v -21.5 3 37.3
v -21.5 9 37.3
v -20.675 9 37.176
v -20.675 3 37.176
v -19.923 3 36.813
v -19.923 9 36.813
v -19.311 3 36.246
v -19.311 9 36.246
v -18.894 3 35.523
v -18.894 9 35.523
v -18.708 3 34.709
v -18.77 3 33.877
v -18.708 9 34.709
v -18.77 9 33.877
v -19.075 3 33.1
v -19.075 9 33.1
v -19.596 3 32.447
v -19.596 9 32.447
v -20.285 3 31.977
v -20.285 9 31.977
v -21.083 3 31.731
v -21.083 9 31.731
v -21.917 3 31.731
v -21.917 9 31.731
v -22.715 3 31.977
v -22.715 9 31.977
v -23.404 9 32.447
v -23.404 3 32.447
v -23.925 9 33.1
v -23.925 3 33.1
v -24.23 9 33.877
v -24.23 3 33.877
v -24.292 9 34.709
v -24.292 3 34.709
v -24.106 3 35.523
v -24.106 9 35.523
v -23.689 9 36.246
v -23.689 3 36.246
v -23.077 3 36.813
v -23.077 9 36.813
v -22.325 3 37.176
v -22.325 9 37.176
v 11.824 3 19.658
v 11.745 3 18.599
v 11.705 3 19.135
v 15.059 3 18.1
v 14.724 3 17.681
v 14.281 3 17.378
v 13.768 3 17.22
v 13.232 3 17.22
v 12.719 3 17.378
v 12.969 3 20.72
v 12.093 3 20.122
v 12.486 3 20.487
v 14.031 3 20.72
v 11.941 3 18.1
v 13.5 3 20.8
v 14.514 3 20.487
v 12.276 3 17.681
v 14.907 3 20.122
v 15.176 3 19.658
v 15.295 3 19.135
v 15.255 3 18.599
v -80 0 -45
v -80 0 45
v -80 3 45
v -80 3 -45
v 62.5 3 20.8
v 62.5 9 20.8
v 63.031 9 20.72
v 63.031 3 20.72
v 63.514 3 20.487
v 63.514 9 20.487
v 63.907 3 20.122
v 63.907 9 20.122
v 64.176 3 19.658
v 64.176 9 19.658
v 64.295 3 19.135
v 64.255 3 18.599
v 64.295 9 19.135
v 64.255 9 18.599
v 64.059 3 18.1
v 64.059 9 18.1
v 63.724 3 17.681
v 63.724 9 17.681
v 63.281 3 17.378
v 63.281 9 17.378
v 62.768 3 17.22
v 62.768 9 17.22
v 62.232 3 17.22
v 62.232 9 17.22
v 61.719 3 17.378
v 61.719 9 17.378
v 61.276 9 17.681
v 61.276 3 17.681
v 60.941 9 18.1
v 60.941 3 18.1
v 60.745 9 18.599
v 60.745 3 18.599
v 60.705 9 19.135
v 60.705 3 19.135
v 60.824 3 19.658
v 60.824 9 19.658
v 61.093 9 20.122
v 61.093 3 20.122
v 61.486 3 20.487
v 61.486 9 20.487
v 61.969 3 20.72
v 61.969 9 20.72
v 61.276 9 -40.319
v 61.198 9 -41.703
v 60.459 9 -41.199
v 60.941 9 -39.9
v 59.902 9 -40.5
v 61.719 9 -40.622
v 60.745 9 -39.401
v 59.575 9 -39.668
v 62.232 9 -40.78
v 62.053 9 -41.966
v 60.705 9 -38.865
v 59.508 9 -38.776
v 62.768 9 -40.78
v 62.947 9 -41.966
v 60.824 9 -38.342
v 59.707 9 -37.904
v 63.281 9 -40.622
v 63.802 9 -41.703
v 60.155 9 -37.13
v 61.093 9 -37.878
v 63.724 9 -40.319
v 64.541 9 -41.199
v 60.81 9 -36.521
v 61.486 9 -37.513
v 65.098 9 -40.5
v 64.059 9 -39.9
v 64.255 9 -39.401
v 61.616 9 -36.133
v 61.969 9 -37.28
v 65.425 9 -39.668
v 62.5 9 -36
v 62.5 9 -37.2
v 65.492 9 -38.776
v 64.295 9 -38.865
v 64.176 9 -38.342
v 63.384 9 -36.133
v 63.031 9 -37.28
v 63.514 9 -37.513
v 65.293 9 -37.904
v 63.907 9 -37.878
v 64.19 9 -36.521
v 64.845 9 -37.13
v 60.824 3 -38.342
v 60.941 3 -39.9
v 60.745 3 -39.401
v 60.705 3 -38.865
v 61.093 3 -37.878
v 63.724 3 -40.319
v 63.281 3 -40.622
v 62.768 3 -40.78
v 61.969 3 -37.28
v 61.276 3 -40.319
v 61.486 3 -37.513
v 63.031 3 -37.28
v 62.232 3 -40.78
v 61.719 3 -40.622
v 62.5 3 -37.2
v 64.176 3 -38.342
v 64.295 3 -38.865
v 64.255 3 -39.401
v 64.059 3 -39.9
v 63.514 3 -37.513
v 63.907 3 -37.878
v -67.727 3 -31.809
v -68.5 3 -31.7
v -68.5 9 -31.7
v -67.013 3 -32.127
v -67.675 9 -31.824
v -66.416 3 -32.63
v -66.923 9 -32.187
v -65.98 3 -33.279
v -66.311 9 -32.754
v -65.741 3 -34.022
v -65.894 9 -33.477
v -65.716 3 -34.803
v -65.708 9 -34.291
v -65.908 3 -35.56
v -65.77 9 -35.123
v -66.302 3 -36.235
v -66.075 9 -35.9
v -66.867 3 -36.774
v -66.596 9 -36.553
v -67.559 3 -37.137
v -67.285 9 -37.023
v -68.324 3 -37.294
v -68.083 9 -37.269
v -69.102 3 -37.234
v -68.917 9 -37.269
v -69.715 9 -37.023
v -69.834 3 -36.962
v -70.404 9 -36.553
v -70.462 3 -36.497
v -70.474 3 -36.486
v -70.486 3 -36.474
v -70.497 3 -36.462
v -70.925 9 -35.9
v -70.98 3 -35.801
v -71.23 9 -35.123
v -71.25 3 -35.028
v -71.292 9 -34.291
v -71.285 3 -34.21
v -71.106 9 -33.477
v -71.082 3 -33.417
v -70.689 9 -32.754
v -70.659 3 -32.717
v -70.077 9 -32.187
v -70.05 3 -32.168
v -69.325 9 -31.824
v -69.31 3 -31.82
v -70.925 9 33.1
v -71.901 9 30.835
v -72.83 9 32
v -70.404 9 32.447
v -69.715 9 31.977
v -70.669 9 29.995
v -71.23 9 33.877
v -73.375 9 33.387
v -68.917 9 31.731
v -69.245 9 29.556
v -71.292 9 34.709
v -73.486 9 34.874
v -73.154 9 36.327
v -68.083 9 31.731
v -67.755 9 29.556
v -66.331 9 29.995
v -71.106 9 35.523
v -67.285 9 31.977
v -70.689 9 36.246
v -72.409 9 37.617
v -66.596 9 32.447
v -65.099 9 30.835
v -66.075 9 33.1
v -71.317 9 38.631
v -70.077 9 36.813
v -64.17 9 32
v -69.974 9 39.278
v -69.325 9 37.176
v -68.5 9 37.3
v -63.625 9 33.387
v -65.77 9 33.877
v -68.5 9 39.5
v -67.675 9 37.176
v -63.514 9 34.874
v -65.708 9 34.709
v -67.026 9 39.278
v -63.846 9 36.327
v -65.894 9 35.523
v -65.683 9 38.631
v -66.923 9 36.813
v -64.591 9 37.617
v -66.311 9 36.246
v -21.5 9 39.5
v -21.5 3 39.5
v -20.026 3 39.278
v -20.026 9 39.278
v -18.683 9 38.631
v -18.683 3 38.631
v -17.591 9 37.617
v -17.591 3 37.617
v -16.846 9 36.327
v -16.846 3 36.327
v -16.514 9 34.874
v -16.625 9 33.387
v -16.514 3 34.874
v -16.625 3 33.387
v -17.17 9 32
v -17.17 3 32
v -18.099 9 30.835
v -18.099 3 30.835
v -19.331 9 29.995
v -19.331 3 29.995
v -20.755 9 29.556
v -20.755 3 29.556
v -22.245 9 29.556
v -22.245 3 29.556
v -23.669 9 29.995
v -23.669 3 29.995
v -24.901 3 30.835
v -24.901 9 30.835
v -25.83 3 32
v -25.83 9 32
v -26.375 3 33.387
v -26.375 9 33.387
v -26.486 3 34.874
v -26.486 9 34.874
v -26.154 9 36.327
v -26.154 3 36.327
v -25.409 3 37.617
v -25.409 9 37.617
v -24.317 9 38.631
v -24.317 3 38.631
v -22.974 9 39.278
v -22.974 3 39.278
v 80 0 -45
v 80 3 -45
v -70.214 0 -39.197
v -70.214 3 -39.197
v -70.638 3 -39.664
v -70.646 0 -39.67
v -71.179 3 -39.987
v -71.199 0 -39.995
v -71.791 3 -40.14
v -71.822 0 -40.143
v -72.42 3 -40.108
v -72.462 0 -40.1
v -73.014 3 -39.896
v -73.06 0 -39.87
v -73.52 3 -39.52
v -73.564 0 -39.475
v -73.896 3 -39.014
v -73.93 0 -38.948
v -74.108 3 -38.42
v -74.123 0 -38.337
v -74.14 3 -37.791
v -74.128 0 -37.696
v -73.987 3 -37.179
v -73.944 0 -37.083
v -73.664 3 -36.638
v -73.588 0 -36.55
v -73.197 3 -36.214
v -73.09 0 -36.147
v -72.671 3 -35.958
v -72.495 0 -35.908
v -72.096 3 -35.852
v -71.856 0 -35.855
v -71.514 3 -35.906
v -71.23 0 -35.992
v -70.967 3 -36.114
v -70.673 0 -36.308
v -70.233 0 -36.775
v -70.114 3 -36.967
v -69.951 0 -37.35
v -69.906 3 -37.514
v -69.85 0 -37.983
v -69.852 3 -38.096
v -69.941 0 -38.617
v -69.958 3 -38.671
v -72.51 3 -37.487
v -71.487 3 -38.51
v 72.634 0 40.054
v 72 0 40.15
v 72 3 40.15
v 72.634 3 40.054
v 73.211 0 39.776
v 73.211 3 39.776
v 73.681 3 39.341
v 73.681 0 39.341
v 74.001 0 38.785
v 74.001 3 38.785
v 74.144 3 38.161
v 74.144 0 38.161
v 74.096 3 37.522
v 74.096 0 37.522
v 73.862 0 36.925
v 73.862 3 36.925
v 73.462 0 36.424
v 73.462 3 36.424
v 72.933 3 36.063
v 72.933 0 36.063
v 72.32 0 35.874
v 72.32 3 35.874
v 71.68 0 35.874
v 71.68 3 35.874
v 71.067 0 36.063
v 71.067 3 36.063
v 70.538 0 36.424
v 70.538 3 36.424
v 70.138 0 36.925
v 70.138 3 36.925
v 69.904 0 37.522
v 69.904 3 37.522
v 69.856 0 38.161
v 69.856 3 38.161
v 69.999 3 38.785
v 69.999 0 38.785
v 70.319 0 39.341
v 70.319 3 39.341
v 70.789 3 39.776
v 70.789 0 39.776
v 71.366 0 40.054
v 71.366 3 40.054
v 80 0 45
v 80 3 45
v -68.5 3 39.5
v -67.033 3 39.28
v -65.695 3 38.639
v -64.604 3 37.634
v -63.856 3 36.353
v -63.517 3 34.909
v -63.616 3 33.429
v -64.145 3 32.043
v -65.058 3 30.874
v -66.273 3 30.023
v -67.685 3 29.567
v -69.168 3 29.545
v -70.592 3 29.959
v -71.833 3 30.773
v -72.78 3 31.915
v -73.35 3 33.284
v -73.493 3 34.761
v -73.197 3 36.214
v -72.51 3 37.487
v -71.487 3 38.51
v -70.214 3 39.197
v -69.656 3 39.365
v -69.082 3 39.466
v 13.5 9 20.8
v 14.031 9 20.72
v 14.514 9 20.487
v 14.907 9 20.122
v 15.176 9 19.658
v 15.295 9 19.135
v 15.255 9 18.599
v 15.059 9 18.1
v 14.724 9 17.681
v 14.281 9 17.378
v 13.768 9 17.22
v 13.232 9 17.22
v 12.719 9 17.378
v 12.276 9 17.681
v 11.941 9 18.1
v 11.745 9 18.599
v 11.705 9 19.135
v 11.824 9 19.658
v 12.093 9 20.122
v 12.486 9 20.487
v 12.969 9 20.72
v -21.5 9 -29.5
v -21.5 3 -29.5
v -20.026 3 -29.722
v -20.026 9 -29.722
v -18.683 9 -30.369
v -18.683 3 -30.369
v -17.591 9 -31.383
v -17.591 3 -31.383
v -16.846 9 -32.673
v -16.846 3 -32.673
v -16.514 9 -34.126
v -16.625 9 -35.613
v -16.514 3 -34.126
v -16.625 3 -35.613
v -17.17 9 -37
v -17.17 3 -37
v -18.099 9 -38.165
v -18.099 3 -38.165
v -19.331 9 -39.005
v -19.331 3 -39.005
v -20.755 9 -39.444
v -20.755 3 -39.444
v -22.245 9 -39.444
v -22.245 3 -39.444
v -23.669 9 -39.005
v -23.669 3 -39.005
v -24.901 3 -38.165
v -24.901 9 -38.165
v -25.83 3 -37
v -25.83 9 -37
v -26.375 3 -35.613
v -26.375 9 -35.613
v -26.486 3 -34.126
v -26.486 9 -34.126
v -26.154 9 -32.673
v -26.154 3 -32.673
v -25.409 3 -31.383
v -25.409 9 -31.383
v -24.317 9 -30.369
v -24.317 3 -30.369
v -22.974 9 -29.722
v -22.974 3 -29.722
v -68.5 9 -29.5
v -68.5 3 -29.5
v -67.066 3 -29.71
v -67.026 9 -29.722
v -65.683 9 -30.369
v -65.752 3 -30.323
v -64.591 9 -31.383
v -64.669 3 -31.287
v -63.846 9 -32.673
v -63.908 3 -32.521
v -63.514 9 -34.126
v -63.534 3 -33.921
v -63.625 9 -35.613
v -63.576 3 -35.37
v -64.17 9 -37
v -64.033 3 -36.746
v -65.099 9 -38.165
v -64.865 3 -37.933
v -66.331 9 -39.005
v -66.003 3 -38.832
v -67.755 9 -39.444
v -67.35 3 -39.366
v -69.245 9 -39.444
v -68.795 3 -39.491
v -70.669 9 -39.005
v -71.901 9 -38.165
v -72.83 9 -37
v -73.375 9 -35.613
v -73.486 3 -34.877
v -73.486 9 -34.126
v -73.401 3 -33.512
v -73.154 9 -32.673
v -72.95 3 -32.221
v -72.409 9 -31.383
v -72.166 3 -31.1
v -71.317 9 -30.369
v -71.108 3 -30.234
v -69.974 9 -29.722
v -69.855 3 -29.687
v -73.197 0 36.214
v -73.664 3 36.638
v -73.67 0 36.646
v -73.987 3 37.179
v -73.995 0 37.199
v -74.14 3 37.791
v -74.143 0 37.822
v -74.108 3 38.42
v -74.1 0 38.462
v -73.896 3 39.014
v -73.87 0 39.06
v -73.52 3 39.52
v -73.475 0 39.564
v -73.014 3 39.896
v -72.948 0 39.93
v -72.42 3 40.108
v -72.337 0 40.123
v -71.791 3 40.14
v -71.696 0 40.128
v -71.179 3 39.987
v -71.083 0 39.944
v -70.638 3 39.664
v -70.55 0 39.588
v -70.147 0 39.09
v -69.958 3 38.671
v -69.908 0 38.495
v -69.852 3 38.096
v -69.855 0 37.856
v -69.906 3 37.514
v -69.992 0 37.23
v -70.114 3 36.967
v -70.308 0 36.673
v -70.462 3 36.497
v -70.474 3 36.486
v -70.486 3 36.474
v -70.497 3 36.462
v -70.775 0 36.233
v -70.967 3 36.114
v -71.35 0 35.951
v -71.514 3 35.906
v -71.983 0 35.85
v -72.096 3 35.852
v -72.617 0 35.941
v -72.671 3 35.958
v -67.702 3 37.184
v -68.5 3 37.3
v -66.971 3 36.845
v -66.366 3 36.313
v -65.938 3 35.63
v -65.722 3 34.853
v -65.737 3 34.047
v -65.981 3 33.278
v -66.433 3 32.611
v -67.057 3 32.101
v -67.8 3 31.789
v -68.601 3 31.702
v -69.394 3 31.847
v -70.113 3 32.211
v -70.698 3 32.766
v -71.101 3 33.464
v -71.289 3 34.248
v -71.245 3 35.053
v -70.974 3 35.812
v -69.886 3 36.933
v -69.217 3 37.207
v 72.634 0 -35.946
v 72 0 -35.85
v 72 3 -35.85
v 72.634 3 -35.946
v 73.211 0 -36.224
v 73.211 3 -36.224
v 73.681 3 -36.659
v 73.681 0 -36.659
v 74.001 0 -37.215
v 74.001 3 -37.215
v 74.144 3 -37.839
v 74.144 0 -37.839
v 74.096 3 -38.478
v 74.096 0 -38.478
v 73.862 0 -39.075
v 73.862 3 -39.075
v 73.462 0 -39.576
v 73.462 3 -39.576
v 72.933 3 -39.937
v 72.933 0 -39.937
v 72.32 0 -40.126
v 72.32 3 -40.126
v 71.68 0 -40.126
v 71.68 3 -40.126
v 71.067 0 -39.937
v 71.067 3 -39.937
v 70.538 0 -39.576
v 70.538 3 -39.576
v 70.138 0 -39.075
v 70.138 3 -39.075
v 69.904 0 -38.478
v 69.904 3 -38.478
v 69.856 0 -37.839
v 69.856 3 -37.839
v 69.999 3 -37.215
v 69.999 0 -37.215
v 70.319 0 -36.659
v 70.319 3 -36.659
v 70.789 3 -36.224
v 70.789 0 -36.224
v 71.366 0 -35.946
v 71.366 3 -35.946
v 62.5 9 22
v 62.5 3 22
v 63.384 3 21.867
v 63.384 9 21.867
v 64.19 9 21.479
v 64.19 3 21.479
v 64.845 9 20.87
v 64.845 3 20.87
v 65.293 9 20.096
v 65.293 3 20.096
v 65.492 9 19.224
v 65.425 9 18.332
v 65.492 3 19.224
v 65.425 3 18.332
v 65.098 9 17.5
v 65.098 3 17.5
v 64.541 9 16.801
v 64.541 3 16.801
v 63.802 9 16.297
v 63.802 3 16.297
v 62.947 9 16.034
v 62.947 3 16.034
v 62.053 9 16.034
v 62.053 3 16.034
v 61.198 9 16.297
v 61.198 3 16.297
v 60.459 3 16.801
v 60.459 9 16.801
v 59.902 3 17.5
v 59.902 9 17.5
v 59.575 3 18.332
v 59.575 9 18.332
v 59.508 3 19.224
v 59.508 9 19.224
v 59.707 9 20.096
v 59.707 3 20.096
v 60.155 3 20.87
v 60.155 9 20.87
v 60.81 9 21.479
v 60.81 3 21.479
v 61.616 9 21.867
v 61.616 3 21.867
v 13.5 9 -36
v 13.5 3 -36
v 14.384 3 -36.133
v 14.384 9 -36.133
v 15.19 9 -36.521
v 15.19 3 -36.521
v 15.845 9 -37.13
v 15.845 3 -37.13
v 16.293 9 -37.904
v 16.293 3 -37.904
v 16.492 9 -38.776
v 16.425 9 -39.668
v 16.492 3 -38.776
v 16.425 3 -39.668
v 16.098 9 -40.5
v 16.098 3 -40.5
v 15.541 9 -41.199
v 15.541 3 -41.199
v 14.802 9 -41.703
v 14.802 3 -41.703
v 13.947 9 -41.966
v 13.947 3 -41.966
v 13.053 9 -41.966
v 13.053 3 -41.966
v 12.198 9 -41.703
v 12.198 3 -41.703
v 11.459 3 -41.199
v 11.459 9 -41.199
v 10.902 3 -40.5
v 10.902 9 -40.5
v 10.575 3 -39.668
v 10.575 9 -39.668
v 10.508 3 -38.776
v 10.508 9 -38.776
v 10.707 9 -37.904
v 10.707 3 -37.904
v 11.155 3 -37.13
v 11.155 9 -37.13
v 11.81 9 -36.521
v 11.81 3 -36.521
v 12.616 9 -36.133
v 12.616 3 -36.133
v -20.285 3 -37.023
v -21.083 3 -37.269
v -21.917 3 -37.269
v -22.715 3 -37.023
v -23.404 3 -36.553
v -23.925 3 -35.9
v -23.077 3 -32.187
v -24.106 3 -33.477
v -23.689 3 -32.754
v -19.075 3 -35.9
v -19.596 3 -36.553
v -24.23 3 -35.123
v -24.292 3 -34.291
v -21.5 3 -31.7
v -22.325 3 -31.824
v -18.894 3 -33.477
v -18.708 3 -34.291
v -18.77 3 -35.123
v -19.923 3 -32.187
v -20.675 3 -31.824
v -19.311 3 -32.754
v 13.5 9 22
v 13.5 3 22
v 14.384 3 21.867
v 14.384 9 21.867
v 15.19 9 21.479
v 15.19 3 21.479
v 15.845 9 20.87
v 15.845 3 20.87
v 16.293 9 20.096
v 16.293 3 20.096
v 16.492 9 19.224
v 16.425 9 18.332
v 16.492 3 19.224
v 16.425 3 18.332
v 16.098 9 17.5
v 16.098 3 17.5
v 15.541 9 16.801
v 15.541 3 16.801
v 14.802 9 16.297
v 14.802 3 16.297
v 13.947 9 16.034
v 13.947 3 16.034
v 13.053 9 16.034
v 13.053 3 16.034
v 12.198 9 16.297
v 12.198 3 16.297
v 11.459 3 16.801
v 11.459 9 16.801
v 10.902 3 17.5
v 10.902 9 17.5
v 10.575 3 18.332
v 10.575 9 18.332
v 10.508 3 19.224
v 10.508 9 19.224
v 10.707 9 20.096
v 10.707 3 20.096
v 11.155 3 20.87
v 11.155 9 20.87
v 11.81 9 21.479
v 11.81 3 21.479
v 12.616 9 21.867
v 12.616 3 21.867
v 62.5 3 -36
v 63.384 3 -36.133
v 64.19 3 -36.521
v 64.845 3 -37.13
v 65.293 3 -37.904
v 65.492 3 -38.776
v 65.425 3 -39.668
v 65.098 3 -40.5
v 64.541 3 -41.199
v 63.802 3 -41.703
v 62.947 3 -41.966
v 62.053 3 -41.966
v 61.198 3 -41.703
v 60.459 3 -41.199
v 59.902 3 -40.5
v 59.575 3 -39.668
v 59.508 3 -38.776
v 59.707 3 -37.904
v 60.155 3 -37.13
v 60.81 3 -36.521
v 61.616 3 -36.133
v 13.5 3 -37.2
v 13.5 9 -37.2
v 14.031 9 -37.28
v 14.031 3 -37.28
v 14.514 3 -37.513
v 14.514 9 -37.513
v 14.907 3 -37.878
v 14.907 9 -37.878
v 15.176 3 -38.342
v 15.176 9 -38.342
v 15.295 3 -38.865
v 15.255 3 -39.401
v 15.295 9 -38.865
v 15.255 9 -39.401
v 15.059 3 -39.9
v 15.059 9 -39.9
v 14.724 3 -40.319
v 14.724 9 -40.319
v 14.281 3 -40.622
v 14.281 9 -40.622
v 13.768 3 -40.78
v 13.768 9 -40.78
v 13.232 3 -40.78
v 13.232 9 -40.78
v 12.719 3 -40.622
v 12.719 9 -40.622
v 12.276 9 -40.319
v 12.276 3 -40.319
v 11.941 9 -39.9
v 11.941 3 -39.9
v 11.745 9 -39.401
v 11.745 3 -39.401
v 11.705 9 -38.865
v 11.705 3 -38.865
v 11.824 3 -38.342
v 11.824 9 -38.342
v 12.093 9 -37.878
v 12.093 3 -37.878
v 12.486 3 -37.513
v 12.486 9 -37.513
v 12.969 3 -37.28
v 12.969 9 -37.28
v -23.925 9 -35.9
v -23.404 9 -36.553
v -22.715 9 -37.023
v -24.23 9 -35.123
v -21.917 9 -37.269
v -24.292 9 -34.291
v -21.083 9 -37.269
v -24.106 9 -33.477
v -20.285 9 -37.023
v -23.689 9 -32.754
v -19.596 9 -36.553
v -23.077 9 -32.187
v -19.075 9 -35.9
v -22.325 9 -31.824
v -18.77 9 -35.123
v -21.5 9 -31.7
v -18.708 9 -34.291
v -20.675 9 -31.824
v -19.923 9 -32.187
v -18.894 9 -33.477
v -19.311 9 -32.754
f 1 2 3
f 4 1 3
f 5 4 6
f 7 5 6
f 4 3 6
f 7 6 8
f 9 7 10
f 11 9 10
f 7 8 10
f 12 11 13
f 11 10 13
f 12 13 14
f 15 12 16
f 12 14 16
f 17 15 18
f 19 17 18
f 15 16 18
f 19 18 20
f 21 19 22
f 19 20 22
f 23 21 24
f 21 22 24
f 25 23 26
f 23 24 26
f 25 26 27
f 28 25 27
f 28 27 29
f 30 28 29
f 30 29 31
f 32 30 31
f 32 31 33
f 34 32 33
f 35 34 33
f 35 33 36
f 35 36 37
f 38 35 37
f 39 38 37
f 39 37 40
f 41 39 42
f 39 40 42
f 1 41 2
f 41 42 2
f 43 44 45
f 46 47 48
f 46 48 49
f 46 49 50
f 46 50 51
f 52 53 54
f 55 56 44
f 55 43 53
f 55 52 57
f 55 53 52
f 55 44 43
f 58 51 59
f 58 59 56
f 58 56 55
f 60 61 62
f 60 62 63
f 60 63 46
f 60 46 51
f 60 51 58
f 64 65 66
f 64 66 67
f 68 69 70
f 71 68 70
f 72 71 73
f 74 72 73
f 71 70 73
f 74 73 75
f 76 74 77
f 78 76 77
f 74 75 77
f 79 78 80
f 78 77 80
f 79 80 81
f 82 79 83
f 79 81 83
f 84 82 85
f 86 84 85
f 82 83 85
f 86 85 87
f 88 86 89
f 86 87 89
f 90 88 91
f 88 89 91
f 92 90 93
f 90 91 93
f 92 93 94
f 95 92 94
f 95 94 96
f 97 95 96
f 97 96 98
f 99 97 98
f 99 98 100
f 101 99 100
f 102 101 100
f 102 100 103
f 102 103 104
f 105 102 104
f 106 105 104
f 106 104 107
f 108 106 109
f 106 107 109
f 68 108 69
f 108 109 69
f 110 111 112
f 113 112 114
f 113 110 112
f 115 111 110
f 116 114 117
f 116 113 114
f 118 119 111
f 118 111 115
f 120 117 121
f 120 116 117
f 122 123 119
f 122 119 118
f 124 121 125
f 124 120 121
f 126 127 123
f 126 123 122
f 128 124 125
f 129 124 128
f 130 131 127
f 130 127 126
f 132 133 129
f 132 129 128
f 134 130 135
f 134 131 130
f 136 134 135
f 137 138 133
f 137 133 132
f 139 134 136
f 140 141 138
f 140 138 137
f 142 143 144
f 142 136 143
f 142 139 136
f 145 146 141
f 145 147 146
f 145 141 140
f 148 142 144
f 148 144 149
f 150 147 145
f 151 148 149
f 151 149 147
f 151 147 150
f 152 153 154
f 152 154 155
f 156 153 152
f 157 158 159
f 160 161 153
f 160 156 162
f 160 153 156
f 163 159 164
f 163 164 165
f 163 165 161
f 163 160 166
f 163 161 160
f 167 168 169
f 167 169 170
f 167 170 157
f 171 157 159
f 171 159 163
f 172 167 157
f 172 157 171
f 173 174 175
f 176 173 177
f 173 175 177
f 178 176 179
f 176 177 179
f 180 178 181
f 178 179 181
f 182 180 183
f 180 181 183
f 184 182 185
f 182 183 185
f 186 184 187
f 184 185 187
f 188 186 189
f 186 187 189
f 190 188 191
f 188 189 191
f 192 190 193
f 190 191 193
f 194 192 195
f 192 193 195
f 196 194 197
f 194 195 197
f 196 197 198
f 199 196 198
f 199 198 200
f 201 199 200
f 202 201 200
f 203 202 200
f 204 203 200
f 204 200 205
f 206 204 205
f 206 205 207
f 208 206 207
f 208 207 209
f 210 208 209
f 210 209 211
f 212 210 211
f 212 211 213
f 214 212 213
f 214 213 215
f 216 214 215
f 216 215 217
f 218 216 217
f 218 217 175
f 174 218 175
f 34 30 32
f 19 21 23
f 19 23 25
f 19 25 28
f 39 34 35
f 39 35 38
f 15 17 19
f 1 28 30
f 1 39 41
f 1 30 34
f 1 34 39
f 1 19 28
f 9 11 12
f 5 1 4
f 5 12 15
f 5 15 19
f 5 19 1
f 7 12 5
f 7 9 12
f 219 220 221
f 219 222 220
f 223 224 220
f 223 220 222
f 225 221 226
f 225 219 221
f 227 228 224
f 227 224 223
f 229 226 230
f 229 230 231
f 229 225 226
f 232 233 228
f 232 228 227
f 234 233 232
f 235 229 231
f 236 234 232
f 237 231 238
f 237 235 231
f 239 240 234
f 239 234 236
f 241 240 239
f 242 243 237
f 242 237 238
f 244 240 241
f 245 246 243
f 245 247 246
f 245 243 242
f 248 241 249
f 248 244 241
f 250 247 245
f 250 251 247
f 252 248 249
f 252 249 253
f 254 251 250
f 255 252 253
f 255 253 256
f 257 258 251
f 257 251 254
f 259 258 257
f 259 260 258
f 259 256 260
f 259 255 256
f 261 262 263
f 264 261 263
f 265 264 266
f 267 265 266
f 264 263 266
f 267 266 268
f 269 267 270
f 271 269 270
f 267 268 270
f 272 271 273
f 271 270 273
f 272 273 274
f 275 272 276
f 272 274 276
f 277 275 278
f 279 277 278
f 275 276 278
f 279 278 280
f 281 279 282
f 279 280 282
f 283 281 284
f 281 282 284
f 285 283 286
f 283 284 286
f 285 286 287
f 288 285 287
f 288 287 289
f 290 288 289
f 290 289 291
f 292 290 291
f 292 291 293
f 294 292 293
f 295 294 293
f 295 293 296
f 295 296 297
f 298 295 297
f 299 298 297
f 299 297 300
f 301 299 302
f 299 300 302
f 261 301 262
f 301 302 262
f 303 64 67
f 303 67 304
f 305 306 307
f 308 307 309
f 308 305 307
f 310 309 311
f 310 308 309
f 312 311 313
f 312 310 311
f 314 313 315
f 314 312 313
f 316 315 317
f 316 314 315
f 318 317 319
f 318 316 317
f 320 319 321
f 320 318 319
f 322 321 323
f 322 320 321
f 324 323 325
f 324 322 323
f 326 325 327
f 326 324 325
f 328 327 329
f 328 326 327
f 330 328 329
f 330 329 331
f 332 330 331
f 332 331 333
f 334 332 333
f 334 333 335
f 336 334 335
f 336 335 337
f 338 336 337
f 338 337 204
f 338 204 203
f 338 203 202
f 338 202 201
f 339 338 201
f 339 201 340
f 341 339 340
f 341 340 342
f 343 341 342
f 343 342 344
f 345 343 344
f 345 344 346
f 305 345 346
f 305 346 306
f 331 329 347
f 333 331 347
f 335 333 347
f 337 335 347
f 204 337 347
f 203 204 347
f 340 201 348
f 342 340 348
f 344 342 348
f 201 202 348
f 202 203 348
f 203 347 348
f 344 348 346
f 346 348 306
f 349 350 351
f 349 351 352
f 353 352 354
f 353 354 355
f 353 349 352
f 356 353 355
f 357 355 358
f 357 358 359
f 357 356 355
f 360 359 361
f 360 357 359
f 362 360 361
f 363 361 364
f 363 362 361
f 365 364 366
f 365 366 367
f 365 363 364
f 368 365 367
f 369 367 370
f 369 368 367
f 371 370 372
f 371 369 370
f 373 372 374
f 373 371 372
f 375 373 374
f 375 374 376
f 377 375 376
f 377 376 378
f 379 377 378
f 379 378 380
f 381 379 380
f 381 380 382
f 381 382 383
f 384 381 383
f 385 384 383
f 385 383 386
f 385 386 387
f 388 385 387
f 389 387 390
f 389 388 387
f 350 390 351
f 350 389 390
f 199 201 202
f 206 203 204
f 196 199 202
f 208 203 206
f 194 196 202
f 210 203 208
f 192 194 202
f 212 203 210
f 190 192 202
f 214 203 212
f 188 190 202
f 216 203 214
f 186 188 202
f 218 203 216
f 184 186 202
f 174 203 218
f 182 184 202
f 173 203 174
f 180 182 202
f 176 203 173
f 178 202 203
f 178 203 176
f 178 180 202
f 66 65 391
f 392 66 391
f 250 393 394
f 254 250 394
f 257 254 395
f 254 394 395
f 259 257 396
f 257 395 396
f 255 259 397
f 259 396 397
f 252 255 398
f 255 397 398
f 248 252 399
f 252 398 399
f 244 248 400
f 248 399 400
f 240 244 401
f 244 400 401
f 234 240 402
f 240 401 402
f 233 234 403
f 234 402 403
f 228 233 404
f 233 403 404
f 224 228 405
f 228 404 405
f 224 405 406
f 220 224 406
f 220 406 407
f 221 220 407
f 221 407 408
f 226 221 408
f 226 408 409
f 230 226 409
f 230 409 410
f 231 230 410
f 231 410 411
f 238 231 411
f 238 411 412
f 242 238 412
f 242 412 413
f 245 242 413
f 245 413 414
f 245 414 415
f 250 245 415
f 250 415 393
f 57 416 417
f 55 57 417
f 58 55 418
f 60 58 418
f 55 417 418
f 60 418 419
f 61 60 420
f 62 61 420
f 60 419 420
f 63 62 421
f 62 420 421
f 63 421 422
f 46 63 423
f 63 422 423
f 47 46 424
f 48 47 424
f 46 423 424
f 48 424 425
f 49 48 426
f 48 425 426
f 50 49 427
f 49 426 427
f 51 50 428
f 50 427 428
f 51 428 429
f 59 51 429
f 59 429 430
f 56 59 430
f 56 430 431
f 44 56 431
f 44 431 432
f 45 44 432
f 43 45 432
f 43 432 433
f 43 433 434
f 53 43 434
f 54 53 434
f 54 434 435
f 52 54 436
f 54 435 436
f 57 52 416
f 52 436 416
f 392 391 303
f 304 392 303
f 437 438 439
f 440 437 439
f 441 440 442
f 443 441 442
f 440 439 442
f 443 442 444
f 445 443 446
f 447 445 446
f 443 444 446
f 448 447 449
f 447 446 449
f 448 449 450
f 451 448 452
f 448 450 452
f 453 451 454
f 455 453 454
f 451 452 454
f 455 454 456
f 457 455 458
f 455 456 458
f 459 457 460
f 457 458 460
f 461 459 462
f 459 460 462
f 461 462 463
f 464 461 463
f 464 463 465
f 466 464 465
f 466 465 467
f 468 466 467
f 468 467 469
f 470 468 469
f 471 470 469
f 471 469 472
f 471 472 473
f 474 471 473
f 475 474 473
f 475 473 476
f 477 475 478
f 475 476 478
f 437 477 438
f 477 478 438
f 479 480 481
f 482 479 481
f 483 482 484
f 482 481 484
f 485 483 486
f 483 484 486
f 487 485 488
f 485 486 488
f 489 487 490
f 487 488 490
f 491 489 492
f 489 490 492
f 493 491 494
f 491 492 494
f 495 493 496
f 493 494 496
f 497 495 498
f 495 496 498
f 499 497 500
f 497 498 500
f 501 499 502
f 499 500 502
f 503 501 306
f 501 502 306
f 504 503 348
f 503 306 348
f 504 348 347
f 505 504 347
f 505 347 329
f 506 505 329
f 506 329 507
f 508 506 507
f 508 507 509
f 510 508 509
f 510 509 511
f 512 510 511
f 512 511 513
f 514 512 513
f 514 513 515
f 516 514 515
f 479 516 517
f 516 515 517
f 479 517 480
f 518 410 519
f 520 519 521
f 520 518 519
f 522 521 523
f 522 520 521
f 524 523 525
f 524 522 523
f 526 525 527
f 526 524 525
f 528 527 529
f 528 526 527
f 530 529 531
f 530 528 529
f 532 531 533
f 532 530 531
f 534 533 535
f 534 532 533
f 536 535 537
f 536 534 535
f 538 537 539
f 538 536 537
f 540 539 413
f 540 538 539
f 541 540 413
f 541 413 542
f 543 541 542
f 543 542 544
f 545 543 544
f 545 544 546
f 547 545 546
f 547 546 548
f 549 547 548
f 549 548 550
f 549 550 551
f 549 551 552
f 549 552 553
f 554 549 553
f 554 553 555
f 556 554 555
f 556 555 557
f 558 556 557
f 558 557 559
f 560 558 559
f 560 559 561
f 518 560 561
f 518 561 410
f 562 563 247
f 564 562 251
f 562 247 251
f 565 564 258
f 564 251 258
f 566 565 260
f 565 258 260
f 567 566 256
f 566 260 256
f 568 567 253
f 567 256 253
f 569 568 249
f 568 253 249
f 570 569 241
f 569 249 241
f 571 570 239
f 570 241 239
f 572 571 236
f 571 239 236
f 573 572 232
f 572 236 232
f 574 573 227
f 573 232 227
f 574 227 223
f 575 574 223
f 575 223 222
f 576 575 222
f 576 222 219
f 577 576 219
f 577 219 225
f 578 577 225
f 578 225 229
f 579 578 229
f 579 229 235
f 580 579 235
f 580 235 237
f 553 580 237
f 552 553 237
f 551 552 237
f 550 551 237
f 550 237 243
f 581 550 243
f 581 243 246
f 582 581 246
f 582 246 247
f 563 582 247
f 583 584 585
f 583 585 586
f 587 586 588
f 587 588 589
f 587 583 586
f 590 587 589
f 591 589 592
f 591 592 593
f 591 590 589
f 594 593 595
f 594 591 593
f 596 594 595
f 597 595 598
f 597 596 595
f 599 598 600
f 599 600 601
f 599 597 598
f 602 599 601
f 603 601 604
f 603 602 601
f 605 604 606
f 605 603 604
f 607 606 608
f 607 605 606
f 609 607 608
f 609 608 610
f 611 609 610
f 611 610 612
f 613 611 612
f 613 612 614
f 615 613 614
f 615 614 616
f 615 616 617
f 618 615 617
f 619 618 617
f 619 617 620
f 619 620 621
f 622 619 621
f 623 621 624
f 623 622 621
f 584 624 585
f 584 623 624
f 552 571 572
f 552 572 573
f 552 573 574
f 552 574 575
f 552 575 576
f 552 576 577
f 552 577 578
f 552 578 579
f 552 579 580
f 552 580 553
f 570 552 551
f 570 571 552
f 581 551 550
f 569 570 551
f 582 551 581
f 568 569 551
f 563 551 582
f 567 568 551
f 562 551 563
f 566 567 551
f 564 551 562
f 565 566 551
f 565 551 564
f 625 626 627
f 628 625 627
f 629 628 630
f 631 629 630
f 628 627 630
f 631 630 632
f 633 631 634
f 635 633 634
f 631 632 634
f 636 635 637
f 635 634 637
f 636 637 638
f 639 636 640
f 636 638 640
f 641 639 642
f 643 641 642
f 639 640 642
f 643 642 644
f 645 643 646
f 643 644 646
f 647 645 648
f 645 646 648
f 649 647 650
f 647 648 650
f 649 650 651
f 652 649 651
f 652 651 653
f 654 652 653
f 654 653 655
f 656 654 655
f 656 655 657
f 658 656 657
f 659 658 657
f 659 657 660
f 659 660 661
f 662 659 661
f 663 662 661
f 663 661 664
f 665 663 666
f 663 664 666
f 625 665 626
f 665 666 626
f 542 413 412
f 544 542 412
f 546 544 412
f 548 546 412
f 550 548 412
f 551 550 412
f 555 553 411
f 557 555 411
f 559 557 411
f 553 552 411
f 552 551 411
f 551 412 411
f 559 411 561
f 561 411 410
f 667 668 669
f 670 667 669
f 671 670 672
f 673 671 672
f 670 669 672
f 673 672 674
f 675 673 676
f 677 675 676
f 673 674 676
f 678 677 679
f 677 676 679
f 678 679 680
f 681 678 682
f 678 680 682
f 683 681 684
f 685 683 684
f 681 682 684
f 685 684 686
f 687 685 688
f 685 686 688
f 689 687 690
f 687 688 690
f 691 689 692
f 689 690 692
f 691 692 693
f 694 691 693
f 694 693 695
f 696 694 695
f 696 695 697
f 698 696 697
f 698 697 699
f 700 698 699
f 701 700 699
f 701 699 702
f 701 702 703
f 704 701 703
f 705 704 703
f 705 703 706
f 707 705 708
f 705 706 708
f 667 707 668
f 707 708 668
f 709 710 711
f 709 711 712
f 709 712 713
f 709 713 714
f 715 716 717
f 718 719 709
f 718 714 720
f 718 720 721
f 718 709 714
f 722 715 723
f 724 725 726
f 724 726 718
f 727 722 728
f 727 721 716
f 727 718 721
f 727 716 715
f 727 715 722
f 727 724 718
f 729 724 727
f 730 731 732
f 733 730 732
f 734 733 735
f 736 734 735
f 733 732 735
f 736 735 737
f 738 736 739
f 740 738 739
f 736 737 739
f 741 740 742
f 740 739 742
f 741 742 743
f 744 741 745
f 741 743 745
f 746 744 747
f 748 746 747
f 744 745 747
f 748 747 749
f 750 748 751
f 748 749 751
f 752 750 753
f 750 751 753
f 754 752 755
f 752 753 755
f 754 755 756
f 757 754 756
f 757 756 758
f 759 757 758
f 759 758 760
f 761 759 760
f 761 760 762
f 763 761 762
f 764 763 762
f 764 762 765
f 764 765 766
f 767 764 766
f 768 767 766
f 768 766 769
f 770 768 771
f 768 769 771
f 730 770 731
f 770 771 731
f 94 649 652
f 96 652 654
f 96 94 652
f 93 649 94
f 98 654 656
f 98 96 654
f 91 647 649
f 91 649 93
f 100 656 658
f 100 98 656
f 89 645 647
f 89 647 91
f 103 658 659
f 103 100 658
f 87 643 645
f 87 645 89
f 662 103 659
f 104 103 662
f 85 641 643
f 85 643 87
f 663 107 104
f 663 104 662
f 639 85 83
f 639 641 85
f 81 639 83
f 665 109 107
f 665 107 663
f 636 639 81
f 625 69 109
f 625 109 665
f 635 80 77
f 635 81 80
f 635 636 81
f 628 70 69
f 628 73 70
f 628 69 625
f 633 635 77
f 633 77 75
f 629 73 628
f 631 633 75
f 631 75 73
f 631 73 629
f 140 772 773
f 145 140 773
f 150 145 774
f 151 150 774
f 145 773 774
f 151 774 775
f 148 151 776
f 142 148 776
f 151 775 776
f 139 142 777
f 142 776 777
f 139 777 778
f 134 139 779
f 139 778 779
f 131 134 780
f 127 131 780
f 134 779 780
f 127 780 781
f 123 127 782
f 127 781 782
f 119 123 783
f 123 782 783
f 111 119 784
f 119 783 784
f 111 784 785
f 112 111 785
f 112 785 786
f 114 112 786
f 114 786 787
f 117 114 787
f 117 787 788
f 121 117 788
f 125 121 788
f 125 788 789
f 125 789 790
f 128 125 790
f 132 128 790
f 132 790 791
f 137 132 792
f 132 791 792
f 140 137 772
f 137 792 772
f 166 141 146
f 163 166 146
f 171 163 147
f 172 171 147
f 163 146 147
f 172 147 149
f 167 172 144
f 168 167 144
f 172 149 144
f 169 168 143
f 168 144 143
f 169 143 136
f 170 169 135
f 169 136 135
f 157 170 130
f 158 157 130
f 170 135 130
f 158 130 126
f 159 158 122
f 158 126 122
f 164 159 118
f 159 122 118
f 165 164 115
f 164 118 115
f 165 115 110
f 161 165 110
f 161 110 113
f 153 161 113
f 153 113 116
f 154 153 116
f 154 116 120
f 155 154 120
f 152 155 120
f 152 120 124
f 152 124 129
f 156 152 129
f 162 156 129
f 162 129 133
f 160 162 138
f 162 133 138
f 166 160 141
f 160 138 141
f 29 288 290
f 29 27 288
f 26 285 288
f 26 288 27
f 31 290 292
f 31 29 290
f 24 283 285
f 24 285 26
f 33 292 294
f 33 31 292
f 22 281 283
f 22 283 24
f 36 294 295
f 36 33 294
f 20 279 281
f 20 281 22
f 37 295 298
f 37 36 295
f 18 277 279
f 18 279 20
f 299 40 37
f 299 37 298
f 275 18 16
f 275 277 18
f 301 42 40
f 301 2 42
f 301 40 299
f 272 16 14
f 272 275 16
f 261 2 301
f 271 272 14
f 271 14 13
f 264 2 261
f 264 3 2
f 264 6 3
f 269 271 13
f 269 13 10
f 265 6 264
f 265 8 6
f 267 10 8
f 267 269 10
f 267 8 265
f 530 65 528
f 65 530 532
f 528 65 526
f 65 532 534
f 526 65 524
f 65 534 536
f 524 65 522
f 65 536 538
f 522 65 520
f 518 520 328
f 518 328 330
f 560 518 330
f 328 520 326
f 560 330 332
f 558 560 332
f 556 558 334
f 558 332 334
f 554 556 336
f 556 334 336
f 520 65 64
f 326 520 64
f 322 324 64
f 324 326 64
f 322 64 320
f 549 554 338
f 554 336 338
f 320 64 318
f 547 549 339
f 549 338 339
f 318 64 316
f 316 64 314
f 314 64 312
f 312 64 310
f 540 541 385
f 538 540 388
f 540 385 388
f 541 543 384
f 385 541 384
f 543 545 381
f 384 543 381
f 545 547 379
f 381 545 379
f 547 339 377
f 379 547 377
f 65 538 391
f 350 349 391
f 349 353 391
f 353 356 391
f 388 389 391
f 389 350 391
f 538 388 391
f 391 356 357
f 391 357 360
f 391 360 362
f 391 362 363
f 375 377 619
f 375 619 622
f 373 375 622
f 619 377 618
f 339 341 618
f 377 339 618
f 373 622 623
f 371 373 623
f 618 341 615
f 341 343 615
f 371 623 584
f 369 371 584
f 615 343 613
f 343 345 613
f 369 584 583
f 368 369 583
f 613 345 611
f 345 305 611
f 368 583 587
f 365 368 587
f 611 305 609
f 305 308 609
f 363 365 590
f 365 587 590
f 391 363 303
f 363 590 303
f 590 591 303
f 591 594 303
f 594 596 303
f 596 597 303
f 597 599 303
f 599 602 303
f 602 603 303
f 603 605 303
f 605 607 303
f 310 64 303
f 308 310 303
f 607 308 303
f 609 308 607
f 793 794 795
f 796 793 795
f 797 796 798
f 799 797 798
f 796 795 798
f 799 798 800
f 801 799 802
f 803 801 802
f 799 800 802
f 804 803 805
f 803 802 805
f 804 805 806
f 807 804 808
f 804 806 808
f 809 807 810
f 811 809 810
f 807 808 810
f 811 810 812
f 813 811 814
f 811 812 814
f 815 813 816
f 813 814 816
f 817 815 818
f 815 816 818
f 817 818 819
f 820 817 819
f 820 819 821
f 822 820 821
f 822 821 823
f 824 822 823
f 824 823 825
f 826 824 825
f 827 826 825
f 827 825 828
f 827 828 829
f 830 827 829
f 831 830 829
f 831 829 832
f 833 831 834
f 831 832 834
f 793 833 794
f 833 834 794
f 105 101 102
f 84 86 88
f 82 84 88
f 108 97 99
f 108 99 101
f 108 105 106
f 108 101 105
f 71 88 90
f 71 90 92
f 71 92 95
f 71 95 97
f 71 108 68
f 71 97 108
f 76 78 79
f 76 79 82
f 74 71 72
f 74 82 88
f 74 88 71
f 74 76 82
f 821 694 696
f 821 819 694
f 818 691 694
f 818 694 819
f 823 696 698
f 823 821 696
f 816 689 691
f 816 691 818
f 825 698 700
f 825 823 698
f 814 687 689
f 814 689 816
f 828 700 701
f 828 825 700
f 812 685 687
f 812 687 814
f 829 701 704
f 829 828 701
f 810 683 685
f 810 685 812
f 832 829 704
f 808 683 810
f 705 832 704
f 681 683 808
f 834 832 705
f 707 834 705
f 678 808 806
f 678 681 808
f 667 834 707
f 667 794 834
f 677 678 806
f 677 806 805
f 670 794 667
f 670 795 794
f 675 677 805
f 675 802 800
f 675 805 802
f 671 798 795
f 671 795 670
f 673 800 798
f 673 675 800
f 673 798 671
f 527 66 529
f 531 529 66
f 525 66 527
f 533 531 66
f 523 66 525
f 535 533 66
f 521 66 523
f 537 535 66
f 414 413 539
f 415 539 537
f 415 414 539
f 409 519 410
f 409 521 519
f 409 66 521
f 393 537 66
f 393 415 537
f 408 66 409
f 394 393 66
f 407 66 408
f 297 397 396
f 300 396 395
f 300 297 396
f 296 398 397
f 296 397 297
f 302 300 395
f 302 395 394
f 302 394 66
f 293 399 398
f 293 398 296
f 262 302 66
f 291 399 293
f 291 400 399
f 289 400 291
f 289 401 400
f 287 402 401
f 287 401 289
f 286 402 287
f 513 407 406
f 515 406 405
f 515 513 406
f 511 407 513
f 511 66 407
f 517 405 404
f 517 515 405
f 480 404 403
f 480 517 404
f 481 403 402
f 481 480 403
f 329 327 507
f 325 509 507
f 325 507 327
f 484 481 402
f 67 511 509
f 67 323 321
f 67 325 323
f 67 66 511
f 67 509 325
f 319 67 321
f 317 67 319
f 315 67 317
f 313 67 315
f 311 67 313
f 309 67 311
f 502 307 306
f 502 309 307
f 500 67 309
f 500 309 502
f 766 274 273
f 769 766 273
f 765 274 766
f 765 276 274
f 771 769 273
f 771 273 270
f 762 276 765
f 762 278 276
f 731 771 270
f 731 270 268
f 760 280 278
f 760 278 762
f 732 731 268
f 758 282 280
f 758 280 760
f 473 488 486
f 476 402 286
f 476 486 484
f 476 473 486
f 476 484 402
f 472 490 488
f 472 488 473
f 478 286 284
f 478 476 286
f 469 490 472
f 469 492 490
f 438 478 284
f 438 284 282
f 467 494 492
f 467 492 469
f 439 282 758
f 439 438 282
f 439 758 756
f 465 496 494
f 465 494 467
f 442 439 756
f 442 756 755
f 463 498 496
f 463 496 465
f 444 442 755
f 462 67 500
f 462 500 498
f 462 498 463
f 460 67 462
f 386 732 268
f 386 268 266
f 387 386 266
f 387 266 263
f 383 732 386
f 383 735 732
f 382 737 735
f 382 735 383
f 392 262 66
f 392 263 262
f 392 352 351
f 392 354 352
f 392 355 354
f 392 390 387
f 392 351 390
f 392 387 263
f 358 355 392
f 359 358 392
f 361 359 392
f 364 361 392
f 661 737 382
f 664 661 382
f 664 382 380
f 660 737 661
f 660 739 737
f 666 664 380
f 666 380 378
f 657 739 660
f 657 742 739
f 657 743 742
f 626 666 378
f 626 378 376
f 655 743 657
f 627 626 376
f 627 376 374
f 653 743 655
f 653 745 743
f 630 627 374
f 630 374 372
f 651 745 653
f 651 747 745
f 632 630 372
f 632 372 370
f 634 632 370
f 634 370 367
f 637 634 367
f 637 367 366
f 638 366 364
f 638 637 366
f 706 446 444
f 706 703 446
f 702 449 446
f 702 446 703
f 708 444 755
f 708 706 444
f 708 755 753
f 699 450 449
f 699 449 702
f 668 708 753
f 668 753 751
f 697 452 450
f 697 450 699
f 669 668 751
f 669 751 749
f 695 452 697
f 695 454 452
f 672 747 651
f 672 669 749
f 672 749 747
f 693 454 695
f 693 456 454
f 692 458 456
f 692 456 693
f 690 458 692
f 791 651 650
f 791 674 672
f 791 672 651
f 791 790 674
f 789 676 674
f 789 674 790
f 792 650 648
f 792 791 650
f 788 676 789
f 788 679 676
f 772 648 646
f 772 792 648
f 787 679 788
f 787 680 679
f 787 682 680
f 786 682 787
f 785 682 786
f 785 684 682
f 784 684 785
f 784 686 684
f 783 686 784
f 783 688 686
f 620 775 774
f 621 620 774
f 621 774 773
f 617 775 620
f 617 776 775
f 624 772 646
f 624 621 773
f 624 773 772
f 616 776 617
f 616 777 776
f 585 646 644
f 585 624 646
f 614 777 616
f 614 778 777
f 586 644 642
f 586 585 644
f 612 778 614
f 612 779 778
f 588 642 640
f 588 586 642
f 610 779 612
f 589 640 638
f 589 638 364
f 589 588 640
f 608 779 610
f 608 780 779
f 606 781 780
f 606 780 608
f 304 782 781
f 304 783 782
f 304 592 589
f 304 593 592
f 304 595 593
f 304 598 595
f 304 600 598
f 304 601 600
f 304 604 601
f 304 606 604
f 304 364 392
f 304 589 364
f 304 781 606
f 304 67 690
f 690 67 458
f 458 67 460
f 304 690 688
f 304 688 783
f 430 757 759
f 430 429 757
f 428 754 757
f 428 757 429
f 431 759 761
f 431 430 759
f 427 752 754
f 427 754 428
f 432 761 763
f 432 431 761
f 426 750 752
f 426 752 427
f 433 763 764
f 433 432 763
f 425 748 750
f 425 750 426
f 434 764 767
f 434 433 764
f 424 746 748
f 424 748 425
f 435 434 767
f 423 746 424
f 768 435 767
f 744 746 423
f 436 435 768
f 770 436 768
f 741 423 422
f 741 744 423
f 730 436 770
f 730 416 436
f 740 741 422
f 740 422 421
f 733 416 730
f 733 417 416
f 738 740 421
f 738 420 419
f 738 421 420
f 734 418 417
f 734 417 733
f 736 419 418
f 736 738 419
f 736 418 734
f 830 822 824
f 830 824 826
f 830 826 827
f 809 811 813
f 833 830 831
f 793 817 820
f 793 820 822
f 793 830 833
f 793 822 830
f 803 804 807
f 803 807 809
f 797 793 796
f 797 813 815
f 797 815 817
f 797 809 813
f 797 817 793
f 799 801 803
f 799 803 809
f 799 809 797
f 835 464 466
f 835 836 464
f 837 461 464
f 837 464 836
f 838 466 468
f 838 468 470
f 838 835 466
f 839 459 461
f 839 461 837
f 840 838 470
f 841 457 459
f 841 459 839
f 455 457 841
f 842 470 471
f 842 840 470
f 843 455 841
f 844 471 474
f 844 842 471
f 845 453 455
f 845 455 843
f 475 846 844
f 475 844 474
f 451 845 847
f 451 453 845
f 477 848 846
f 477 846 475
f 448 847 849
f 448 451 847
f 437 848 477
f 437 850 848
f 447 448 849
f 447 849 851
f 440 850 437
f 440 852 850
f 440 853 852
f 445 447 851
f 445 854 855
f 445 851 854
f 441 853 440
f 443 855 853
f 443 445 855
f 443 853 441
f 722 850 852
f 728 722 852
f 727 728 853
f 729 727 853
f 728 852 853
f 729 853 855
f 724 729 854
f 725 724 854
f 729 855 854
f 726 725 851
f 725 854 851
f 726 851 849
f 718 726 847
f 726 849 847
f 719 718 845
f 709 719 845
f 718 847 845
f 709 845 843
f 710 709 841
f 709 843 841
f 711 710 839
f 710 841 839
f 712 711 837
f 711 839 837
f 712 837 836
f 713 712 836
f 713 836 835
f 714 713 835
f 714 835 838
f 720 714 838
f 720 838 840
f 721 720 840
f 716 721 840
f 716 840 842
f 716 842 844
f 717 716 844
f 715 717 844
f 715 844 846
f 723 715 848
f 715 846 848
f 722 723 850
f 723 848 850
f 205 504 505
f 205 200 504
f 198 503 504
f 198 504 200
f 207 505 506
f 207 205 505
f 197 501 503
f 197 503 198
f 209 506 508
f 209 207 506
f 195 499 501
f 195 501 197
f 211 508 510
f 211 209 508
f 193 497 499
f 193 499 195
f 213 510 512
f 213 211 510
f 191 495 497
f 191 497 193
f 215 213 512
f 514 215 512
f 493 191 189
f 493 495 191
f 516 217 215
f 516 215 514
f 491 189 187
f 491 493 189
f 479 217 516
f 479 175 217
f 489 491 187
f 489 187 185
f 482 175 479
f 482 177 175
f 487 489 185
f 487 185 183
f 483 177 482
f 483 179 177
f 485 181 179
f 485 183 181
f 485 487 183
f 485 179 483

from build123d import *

# Parameters (mm, degrees)
SK_PLATE_W         = 160
SK_PLATE_H         = 90
EX_PLATE_DEPTH     = 3
SK_STANDOFFS_R     = 3
SK_STANDOFFS_R_2   = 5
EX_STANDOFFS_DEPTH = 6
SK_INSERTS_R       = 1.8
SK_INSERTS_R_2     = 2.8
CUT_INSERTS_DEPTH  = 6
SK_PANHOLES_R      = 2.15
CUT_PANHOLES_DEPTH = 3


with BuildPart() as part:
    # SK_Plate → EX_Plate (new body)
    with BuildSketch(Plane(origin=(0, 0, 0), x_dir=(1, 0, 0), z_dir=(0, 1, 0))):
        Rectangle(SK_PLATE_W, SK_PLATE_H)
    extrude(amount=EX_PLATE_DEPTH)

    # SK_Standoffs → EX_Standoffs (add)
    with BuildSketch(Plane(origin=(0, 3, 0), x_dir=(1, 0, 0), z_dir=(0, 1, 0))):
        with Locations((62.5, 39)):
            Circle(SK_STANDOFFS_R)
        with Locations((13.5, 39)):
            Circle(SK_STANDOFFS_R)
        with Locations((62.5, -19)):
            Circle(SK_STANDOFFS_R)
        with Locations((13.5, -19)):
            Circle(SK_STANDOFFS_R)
        with Locations((-21.5, -34.5)):
            Circle(SK_STANDOFFS_R_2)
        with Locations((-68.5, -34.5)):
            Circle(SK_STANDOFFS_R_2)
        with Locations((-21.5, 34.5)):
            Circle(SK_STANDOFFS_R_2)
        with Locations((-68.5, 34.5)):
            Circle(SK_STANDOFFS_R_2)
    extrude(amount=EX_STANDOFFS_DEPTH)

    # SK_Inserts → CUT_Inserts (cut)
    with BuildSketch(Plane(origin=(0, 9, 0), x_dir=(1, 0, 0), z_dir=(0, 1, 0))):
        with Locations((62.5, 39)):
            Circle(SK_INSERTS_R)
        with Locations((13.5, 39)):
            Circle(SK_INSERTS_R)
        with Locations((62.5, -19)):
            Circle(SK_INSERTS_R)
        with Locations((13.5, -19)):
            Circle(SK_INSERTS_R)
        with Locations((-21.5, -34.5)):
            Circle(SK_INSERTS_R_2)
        with Locations((-68.5, -34.5)):
            Circle(SK_INSERTS_R_2)
        with Locations((-21.5, 34.5)):
            Circle(SK_INSERTS_R_2)
        with Locations((-68.5, 34.5)):
            Circle(SK_INSERTS_R_2)
    extrude(amount=-CUT_INSERTS_DEPTH, mode=Mode.SUBTRACT)

    # SK_PanHoles → CUT_PanHoles (cut)
    with BuildSketch(Plane(origin=(0, 0, 0), x_dir=(1, 0, 0), z_dir=(0, 1, 0))):
        with Locations((72, -38)):
            Circle(SK_PANHOLES_R)
        with Locations((-72, -38)):
            Circle(SK_PANHOLES_R)
        with Locations((72, 38)):
            Circle(SK_PANHOLES_R)
        with Locations((-72, 38)):
            Circle(SK_PANHOLES_R)
    extrude(amount=CUT_PANHOLES_DEPTH, mode=Mode.SUBTRACT)


solid = part.part
